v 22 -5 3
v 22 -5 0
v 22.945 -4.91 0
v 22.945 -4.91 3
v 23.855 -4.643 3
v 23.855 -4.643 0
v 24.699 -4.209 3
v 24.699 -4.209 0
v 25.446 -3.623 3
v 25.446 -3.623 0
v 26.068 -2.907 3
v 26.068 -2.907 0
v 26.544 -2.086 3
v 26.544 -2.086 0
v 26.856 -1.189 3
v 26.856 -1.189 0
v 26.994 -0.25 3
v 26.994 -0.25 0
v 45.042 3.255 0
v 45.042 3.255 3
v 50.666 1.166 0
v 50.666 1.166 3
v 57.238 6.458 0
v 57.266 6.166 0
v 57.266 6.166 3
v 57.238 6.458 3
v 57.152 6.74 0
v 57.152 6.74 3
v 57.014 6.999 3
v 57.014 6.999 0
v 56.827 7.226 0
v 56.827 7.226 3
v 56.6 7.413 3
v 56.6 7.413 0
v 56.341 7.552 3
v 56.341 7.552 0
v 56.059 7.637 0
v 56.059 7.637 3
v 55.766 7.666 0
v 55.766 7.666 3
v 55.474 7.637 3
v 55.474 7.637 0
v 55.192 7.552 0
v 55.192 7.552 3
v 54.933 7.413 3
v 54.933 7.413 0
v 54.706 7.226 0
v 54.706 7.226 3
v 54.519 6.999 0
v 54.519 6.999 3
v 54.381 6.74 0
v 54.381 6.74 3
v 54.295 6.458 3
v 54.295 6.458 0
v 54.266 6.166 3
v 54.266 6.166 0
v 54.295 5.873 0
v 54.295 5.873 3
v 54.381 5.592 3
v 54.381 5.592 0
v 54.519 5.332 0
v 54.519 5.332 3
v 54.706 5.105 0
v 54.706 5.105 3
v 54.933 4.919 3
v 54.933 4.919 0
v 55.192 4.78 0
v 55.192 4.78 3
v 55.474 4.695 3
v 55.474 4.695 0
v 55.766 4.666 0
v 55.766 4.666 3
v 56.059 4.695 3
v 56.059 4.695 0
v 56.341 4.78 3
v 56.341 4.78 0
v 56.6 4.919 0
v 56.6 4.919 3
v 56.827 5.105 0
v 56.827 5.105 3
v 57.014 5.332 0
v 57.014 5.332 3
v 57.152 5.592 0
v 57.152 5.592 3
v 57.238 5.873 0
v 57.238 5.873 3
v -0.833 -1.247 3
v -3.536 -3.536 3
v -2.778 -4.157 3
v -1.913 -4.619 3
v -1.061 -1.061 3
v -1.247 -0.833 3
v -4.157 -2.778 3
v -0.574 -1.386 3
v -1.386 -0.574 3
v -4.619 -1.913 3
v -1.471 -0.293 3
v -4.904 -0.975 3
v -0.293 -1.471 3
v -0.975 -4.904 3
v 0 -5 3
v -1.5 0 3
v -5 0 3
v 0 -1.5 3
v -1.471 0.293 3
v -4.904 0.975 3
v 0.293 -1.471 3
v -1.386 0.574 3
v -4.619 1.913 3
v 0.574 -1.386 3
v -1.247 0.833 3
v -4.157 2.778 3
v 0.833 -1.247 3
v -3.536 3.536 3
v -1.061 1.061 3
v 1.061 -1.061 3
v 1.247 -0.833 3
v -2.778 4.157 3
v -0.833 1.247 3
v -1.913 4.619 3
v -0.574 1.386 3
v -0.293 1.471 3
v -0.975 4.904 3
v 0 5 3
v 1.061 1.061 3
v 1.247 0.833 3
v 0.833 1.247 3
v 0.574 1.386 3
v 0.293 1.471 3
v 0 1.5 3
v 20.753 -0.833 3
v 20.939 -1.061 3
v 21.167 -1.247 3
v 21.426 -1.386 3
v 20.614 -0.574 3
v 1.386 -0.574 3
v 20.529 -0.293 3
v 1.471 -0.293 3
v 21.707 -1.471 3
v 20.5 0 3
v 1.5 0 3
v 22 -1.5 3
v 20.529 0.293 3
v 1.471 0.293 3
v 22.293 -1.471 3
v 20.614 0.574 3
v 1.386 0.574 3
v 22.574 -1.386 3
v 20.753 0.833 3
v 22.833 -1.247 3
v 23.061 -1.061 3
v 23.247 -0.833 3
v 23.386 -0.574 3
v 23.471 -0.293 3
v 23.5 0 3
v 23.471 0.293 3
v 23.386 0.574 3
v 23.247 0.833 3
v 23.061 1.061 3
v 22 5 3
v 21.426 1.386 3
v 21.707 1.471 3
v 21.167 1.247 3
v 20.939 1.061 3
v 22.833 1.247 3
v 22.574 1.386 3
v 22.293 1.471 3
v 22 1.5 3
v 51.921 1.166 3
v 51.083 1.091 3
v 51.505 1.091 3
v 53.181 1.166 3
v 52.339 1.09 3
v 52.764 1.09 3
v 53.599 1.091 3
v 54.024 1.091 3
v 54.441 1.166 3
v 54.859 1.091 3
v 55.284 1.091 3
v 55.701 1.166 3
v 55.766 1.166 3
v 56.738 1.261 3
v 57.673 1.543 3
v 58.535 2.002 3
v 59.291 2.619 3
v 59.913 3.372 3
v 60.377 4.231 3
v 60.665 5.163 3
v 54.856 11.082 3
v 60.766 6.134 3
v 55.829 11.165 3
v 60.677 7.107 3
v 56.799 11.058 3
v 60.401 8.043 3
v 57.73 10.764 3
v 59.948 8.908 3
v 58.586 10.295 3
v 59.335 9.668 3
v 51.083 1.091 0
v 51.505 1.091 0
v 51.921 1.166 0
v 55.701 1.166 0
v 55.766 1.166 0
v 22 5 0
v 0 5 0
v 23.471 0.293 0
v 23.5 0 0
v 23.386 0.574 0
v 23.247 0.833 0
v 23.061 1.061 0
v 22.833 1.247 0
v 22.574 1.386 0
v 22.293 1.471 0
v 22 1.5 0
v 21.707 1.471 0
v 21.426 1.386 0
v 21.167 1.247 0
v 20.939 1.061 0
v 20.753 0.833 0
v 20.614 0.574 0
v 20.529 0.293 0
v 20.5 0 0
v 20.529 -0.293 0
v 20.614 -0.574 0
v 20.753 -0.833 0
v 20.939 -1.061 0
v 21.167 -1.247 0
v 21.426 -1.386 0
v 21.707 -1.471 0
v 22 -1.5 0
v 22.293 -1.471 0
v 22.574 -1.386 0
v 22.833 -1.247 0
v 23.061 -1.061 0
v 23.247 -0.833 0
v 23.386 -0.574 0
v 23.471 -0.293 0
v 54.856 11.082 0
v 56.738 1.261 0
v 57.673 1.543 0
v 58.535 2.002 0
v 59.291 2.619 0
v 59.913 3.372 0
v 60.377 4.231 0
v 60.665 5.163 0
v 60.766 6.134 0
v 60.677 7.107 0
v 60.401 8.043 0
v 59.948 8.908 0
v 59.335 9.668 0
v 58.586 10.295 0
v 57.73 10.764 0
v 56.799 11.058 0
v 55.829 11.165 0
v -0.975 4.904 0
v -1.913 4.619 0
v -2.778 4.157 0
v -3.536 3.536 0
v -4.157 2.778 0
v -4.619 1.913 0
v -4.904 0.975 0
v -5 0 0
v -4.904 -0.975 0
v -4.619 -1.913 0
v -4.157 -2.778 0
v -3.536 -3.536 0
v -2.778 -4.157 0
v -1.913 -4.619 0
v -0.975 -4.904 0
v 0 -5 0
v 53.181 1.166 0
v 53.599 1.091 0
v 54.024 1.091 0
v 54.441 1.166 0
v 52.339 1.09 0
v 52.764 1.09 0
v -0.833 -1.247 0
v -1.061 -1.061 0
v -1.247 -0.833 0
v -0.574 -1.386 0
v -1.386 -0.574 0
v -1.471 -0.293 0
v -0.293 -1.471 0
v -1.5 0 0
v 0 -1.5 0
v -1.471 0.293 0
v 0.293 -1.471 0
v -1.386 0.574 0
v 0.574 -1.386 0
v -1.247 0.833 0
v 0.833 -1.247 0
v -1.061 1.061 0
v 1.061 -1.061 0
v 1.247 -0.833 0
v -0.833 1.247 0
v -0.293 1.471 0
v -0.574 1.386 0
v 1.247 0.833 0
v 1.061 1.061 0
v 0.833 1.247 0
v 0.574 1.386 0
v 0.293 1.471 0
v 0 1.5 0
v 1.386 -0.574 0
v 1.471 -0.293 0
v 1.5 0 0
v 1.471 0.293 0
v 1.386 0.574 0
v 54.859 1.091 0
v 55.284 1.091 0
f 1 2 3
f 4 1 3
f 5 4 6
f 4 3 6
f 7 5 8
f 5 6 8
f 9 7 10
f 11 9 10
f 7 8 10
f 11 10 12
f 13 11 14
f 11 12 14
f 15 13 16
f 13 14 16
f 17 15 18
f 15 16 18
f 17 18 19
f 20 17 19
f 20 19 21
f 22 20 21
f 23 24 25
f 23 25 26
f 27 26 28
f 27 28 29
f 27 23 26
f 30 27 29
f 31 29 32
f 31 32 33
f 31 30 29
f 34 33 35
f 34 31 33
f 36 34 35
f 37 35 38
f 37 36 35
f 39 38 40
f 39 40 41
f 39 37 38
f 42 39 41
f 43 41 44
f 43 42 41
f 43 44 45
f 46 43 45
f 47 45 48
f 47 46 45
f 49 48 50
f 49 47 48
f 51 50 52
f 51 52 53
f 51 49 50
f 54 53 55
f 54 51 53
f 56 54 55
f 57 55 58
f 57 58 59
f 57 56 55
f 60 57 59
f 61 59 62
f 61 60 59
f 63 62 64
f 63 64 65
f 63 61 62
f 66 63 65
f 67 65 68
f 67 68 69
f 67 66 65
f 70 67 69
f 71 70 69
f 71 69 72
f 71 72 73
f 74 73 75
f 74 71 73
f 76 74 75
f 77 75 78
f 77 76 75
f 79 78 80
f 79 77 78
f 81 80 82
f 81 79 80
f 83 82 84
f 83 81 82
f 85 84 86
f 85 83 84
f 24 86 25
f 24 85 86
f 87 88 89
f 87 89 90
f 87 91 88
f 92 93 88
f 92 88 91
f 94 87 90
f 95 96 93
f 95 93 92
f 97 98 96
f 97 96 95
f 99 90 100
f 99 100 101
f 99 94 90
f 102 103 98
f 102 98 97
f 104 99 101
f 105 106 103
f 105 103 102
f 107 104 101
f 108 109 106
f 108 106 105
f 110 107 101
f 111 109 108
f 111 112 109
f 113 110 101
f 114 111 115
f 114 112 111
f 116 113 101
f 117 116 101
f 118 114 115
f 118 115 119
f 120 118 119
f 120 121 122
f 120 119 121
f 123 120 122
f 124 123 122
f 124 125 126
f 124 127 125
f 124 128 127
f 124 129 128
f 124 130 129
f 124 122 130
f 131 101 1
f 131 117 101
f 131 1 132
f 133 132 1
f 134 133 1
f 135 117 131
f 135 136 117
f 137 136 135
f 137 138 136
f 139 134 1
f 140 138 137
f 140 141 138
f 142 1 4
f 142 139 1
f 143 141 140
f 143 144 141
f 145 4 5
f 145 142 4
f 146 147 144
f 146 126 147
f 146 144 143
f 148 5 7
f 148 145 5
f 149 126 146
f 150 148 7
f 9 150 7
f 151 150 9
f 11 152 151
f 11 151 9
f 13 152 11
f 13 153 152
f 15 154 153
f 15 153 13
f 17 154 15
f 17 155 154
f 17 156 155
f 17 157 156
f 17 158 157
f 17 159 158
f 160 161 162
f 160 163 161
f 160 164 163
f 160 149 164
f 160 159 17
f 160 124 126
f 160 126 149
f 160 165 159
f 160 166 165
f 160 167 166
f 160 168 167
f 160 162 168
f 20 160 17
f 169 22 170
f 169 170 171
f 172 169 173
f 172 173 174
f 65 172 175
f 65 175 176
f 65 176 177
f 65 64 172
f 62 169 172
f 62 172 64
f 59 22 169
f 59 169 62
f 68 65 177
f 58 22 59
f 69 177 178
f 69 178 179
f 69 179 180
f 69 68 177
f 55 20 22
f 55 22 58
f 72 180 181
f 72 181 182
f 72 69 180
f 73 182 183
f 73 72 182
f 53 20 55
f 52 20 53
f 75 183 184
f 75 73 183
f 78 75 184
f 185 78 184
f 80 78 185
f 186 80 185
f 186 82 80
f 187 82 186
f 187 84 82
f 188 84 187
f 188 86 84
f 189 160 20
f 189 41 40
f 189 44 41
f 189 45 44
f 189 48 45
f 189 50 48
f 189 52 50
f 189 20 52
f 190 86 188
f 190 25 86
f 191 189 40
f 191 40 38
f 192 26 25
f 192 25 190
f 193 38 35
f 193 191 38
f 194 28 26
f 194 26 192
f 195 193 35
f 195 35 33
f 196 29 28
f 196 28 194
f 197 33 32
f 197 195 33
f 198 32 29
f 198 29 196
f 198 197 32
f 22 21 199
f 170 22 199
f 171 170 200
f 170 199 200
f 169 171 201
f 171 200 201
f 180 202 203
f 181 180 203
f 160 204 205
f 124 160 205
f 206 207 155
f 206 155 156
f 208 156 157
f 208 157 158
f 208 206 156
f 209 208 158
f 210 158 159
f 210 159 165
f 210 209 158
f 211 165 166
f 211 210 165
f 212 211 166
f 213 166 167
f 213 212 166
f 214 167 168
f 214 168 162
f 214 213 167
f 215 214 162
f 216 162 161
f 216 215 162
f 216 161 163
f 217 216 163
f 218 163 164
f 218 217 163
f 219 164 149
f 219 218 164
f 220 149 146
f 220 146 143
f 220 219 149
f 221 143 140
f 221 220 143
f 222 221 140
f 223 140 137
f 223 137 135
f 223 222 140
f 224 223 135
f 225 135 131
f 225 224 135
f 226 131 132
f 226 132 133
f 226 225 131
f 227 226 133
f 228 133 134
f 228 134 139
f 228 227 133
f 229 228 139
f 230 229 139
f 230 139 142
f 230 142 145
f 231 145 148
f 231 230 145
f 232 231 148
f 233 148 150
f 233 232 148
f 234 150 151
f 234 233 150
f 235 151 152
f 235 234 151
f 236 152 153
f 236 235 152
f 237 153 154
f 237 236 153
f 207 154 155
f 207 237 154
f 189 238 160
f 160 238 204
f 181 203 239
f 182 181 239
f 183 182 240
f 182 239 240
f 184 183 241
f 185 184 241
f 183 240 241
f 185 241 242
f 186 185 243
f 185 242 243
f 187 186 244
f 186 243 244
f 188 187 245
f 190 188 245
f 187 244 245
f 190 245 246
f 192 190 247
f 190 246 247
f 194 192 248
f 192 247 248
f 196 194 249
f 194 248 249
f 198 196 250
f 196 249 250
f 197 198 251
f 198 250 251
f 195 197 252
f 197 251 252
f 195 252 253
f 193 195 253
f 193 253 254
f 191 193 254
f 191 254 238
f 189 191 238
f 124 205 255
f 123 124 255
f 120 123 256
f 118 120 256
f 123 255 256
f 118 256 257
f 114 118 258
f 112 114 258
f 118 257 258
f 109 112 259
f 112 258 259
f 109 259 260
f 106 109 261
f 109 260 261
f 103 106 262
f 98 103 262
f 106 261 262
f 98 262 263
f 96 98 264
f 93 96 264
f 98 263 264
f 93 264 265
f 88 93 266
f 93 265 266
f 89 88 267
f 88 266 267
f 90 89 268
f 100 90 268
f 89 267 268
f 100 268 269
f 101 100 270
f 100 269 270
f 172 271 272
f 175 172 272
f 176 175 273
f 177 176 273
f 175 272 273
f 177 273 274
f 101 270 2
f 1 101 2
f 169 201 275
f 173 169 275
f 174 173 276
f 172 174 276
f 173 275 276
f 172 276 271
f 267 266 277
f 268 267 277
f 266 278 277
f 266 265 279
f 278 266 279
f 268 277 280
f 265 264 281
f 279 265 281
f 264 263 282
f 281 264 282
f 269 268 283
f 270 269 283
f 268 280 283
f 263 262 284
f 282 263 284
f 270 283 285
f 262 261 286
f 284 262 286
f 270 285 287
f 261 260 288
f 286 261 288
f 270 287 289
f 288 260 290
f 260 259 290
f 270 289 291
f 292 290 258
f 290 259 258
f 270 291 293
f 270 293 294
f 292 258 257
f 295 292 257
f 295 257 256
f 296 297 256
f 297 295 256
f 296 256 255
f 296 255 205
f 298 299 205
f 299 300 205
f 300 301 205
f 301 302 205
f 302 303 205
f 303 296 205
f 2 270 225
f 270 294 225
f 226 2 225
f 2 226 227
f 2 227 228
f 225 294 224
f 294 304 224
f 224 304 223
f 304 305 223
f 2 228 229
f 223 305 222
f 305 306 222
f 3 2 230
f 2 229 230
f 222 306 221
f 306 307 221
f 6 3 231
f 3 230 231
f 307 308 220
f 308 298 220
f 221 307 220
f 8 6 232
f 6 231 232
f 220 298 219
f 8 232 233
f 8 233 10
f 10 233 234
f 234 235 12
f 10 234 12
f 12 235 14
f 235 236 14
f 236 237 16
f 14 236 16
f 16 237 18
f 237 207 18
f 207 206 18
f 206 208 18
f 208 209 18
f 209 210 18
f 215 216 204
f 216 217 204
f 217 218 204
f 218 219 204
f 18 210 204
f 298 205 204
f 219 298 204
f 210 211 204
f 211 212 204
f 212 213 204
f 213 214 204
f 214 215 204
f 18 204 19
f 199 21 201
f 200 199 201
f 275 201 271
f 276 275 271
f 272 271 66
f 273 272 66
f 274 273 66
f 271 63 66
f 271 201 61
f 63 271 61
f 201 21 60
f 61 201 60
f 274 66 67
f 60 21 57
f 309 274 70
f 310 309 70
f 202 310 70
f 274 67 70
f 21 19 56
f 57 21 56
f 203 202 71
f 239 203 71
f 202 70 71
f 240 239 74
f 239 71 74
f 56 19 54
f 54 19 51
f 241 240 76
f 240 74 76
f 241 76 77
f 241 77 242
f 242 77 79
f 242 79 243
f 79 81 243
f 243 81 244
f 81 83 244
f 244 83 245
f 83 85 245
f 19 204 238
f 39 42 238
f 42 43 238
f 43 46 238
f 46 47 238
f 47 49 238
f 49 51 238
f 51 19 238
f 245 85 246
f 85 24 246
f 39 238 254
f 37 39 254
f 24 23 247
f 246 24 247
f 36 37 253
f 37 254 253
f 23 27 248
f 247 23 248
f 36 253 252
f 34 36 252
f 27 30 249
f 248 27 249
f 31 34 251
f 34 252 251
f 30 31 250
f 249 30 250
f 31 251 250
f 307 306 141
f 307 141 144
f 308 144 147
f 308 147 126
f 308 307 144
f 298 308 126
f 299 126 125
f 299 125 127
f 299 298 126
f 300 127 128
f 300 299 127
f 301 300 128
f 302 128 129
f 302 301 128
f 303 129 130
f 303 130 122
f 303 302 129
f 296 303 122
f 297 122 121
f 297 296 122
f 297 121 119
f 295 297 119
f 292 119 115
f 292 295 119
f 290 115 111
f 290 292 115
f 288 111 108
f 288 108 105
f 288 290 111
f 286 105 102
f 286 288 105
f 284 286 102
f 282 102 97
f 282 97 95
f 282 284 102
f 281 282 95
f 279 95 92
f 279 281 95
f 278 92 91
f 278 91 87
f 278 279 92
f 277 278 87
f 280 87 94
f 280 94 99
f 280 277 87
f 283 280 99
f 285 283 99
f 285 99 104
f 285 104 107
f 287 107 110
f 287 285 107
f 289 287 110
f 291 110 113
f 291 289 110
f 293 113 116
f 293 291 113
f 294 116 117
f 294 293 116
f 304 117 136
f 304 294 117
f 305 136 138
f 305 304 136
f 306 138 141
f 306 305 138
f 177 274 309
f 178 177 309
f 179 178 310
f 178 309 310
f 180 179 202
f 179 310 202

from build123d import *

# Parameters (mm, degrees)
SCHIZZO1_R                   = 1.5
ESTRUSIONE_ESTRUSIONE1_DEPTH = 3


with BuildPart() as part:
    # Schizzo1 → Estrusione-Estrusione1 (new body)
    with BuildSketch(Plane.XY):
        with BuildLine():
            Line((22, 5), (0, 5))
            ThreePointArc((0, 5), (-5, 0), (0, -5))
            Line((0, -5), (22, -5))
            ThreePointArc((22, -5), (25.445859834, -3.622989098), (26.993725045, -0.250420003))
            Line((26.993725045, -0.250420003), (45.041832618, 3.254653548))
            Line((45.041832618, 3.254653548), (50.666477461, 1.165785339))
            ThreePointArc((50.666477461, 1.165785339), (51.293977461, 1.08172232), (51.921477461, 1.165785339))
            ThreePointArc((51.921477461, 1.165785339), (52.551477461, 1.081007878), (53.181477461, 1.165785339))
            ThreePointArc((53.181477461, 1.165785339), (53.811477461, 1.081063133), (54.441477461, 1.165785339))
            ThreePointArc((54.441477461, 1.165785339), (55.071477461, 1.081063133), (55.701477461, 1.165785339))
            Line((55.701477461, 1.165785339), (55.766477461, 1.165785339))
            ThreePointArc((55.766477461, 1.165785339), (60.745551277, 6.622757917), (54.856357382, 11.082255764))
            Line((54.856357382, 11.082255764), (22, 5))
        make_face()
        Circle(SCHIZZO1_R, mode=Mode.SUBTRACT)
        with Locations((22, 0)):
            Circle(SCHIZZO1_R, mode=Mode.SUBTRACT)
        with Locations((55.766477461, 6.165785339)):
            Circle(SCHIZZO1_R, mode=Mode.SUBTRACT)
    extrude(amount=ESTRUSIONE_ESTRUSIONE1_DEPTH)


solid = part.part
